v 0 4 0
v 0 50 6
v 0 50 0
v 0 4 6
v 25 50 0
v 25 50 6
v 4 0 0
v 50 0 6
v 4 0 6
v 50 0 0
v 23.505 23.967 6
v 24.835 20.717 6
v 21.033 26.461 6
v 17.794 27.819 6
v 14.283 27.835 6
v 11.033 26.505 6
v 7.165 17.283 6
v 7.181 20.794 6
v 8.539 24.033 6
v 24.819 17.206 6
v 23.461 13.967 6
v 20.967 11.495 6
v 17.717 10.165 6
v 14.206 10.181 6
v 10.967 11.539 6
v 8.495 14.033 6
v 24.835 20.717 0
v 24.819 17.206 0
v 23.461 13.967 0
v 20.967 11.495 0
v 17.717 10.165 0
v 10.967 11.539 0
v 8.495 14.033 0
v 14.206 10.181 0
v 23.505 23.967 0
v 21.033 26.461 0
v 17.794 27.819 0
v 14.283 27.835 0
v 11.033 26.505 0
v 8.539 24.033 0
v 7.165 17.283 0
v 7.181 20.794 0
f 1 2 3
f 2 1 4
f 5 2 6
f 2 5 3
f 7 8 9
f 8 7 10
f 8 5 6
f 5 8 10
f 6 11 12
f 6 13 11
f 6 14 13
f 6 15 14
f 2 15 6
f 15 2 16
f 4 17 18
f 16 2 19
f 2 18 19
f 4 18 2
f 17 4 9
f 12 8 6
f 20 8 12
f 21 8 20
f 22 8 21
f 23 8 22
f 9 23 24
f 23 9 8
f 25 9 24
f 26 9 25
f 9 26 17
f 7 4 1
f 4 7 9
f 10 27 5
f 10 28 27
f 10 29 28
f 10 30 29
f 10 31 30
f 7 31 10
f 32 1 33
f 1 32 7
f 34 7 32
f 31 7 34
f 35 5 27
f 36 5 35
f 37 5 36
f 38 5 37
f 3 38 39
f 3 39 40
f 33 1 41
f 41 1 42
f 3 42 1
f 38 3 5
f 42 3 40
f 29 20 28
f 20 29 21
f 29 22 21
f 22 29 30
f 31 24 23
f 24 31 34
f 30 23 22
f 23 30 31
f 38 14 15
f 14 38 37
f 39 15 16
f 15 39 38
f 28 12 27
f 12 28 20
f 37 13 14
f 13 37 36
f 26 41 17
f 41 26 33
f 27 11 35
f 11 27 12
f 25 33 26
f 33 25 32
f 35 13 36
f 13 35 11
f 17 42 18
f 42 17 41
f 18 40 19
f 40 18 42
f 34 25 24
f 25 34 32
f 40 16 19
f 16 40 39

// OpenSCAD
$fn = 32;

// ----------------------------------------------------------------------
// Bracket plate: gusset 50 x 50
// ----------------------------------------------------------------------

// --- parameters (mm) ---
hole_r = 4;               // bolt hole radius
plate_t = 6;              // plate thickness, Z (extrusion height)
gus_a = 50;               // base length
gus_b = 50;               // height
top_x = 25;               // top edge X of the angled cut
light_r = 9;              // lightening hole radius

light_d = 2 * light_r;

profile = [[4, 0], [25, 0], [50, 0], [25, 50], [0, 50], [0, 4]];  // primary outline, 6 points, counter clockwise
void_1 = [[24.835, 20.717], [23.505, 23.967], [21.033, 26.461], [17.794, 27.819], [14.283, 27.835], [11.033, 26.505], [8.539, 24.033], [7.181, 20.794], [7.165, 17.283], [8.495, 14.033], [10.967, 11.539], [14.206, 10.181], [17.717, 10.165], [20.967, 11.495], [23.461, 13.967], [24.819, 17.206]];  // lightening hole, 16 points

// --- the one profile operation ---
difference() {
  linear_extrude(height = plate_t) polygon(points = profile);
  translate([0, 0, -1])
    linear_extrude(height = plate_t + 2) polygon(points = void_1);
}
